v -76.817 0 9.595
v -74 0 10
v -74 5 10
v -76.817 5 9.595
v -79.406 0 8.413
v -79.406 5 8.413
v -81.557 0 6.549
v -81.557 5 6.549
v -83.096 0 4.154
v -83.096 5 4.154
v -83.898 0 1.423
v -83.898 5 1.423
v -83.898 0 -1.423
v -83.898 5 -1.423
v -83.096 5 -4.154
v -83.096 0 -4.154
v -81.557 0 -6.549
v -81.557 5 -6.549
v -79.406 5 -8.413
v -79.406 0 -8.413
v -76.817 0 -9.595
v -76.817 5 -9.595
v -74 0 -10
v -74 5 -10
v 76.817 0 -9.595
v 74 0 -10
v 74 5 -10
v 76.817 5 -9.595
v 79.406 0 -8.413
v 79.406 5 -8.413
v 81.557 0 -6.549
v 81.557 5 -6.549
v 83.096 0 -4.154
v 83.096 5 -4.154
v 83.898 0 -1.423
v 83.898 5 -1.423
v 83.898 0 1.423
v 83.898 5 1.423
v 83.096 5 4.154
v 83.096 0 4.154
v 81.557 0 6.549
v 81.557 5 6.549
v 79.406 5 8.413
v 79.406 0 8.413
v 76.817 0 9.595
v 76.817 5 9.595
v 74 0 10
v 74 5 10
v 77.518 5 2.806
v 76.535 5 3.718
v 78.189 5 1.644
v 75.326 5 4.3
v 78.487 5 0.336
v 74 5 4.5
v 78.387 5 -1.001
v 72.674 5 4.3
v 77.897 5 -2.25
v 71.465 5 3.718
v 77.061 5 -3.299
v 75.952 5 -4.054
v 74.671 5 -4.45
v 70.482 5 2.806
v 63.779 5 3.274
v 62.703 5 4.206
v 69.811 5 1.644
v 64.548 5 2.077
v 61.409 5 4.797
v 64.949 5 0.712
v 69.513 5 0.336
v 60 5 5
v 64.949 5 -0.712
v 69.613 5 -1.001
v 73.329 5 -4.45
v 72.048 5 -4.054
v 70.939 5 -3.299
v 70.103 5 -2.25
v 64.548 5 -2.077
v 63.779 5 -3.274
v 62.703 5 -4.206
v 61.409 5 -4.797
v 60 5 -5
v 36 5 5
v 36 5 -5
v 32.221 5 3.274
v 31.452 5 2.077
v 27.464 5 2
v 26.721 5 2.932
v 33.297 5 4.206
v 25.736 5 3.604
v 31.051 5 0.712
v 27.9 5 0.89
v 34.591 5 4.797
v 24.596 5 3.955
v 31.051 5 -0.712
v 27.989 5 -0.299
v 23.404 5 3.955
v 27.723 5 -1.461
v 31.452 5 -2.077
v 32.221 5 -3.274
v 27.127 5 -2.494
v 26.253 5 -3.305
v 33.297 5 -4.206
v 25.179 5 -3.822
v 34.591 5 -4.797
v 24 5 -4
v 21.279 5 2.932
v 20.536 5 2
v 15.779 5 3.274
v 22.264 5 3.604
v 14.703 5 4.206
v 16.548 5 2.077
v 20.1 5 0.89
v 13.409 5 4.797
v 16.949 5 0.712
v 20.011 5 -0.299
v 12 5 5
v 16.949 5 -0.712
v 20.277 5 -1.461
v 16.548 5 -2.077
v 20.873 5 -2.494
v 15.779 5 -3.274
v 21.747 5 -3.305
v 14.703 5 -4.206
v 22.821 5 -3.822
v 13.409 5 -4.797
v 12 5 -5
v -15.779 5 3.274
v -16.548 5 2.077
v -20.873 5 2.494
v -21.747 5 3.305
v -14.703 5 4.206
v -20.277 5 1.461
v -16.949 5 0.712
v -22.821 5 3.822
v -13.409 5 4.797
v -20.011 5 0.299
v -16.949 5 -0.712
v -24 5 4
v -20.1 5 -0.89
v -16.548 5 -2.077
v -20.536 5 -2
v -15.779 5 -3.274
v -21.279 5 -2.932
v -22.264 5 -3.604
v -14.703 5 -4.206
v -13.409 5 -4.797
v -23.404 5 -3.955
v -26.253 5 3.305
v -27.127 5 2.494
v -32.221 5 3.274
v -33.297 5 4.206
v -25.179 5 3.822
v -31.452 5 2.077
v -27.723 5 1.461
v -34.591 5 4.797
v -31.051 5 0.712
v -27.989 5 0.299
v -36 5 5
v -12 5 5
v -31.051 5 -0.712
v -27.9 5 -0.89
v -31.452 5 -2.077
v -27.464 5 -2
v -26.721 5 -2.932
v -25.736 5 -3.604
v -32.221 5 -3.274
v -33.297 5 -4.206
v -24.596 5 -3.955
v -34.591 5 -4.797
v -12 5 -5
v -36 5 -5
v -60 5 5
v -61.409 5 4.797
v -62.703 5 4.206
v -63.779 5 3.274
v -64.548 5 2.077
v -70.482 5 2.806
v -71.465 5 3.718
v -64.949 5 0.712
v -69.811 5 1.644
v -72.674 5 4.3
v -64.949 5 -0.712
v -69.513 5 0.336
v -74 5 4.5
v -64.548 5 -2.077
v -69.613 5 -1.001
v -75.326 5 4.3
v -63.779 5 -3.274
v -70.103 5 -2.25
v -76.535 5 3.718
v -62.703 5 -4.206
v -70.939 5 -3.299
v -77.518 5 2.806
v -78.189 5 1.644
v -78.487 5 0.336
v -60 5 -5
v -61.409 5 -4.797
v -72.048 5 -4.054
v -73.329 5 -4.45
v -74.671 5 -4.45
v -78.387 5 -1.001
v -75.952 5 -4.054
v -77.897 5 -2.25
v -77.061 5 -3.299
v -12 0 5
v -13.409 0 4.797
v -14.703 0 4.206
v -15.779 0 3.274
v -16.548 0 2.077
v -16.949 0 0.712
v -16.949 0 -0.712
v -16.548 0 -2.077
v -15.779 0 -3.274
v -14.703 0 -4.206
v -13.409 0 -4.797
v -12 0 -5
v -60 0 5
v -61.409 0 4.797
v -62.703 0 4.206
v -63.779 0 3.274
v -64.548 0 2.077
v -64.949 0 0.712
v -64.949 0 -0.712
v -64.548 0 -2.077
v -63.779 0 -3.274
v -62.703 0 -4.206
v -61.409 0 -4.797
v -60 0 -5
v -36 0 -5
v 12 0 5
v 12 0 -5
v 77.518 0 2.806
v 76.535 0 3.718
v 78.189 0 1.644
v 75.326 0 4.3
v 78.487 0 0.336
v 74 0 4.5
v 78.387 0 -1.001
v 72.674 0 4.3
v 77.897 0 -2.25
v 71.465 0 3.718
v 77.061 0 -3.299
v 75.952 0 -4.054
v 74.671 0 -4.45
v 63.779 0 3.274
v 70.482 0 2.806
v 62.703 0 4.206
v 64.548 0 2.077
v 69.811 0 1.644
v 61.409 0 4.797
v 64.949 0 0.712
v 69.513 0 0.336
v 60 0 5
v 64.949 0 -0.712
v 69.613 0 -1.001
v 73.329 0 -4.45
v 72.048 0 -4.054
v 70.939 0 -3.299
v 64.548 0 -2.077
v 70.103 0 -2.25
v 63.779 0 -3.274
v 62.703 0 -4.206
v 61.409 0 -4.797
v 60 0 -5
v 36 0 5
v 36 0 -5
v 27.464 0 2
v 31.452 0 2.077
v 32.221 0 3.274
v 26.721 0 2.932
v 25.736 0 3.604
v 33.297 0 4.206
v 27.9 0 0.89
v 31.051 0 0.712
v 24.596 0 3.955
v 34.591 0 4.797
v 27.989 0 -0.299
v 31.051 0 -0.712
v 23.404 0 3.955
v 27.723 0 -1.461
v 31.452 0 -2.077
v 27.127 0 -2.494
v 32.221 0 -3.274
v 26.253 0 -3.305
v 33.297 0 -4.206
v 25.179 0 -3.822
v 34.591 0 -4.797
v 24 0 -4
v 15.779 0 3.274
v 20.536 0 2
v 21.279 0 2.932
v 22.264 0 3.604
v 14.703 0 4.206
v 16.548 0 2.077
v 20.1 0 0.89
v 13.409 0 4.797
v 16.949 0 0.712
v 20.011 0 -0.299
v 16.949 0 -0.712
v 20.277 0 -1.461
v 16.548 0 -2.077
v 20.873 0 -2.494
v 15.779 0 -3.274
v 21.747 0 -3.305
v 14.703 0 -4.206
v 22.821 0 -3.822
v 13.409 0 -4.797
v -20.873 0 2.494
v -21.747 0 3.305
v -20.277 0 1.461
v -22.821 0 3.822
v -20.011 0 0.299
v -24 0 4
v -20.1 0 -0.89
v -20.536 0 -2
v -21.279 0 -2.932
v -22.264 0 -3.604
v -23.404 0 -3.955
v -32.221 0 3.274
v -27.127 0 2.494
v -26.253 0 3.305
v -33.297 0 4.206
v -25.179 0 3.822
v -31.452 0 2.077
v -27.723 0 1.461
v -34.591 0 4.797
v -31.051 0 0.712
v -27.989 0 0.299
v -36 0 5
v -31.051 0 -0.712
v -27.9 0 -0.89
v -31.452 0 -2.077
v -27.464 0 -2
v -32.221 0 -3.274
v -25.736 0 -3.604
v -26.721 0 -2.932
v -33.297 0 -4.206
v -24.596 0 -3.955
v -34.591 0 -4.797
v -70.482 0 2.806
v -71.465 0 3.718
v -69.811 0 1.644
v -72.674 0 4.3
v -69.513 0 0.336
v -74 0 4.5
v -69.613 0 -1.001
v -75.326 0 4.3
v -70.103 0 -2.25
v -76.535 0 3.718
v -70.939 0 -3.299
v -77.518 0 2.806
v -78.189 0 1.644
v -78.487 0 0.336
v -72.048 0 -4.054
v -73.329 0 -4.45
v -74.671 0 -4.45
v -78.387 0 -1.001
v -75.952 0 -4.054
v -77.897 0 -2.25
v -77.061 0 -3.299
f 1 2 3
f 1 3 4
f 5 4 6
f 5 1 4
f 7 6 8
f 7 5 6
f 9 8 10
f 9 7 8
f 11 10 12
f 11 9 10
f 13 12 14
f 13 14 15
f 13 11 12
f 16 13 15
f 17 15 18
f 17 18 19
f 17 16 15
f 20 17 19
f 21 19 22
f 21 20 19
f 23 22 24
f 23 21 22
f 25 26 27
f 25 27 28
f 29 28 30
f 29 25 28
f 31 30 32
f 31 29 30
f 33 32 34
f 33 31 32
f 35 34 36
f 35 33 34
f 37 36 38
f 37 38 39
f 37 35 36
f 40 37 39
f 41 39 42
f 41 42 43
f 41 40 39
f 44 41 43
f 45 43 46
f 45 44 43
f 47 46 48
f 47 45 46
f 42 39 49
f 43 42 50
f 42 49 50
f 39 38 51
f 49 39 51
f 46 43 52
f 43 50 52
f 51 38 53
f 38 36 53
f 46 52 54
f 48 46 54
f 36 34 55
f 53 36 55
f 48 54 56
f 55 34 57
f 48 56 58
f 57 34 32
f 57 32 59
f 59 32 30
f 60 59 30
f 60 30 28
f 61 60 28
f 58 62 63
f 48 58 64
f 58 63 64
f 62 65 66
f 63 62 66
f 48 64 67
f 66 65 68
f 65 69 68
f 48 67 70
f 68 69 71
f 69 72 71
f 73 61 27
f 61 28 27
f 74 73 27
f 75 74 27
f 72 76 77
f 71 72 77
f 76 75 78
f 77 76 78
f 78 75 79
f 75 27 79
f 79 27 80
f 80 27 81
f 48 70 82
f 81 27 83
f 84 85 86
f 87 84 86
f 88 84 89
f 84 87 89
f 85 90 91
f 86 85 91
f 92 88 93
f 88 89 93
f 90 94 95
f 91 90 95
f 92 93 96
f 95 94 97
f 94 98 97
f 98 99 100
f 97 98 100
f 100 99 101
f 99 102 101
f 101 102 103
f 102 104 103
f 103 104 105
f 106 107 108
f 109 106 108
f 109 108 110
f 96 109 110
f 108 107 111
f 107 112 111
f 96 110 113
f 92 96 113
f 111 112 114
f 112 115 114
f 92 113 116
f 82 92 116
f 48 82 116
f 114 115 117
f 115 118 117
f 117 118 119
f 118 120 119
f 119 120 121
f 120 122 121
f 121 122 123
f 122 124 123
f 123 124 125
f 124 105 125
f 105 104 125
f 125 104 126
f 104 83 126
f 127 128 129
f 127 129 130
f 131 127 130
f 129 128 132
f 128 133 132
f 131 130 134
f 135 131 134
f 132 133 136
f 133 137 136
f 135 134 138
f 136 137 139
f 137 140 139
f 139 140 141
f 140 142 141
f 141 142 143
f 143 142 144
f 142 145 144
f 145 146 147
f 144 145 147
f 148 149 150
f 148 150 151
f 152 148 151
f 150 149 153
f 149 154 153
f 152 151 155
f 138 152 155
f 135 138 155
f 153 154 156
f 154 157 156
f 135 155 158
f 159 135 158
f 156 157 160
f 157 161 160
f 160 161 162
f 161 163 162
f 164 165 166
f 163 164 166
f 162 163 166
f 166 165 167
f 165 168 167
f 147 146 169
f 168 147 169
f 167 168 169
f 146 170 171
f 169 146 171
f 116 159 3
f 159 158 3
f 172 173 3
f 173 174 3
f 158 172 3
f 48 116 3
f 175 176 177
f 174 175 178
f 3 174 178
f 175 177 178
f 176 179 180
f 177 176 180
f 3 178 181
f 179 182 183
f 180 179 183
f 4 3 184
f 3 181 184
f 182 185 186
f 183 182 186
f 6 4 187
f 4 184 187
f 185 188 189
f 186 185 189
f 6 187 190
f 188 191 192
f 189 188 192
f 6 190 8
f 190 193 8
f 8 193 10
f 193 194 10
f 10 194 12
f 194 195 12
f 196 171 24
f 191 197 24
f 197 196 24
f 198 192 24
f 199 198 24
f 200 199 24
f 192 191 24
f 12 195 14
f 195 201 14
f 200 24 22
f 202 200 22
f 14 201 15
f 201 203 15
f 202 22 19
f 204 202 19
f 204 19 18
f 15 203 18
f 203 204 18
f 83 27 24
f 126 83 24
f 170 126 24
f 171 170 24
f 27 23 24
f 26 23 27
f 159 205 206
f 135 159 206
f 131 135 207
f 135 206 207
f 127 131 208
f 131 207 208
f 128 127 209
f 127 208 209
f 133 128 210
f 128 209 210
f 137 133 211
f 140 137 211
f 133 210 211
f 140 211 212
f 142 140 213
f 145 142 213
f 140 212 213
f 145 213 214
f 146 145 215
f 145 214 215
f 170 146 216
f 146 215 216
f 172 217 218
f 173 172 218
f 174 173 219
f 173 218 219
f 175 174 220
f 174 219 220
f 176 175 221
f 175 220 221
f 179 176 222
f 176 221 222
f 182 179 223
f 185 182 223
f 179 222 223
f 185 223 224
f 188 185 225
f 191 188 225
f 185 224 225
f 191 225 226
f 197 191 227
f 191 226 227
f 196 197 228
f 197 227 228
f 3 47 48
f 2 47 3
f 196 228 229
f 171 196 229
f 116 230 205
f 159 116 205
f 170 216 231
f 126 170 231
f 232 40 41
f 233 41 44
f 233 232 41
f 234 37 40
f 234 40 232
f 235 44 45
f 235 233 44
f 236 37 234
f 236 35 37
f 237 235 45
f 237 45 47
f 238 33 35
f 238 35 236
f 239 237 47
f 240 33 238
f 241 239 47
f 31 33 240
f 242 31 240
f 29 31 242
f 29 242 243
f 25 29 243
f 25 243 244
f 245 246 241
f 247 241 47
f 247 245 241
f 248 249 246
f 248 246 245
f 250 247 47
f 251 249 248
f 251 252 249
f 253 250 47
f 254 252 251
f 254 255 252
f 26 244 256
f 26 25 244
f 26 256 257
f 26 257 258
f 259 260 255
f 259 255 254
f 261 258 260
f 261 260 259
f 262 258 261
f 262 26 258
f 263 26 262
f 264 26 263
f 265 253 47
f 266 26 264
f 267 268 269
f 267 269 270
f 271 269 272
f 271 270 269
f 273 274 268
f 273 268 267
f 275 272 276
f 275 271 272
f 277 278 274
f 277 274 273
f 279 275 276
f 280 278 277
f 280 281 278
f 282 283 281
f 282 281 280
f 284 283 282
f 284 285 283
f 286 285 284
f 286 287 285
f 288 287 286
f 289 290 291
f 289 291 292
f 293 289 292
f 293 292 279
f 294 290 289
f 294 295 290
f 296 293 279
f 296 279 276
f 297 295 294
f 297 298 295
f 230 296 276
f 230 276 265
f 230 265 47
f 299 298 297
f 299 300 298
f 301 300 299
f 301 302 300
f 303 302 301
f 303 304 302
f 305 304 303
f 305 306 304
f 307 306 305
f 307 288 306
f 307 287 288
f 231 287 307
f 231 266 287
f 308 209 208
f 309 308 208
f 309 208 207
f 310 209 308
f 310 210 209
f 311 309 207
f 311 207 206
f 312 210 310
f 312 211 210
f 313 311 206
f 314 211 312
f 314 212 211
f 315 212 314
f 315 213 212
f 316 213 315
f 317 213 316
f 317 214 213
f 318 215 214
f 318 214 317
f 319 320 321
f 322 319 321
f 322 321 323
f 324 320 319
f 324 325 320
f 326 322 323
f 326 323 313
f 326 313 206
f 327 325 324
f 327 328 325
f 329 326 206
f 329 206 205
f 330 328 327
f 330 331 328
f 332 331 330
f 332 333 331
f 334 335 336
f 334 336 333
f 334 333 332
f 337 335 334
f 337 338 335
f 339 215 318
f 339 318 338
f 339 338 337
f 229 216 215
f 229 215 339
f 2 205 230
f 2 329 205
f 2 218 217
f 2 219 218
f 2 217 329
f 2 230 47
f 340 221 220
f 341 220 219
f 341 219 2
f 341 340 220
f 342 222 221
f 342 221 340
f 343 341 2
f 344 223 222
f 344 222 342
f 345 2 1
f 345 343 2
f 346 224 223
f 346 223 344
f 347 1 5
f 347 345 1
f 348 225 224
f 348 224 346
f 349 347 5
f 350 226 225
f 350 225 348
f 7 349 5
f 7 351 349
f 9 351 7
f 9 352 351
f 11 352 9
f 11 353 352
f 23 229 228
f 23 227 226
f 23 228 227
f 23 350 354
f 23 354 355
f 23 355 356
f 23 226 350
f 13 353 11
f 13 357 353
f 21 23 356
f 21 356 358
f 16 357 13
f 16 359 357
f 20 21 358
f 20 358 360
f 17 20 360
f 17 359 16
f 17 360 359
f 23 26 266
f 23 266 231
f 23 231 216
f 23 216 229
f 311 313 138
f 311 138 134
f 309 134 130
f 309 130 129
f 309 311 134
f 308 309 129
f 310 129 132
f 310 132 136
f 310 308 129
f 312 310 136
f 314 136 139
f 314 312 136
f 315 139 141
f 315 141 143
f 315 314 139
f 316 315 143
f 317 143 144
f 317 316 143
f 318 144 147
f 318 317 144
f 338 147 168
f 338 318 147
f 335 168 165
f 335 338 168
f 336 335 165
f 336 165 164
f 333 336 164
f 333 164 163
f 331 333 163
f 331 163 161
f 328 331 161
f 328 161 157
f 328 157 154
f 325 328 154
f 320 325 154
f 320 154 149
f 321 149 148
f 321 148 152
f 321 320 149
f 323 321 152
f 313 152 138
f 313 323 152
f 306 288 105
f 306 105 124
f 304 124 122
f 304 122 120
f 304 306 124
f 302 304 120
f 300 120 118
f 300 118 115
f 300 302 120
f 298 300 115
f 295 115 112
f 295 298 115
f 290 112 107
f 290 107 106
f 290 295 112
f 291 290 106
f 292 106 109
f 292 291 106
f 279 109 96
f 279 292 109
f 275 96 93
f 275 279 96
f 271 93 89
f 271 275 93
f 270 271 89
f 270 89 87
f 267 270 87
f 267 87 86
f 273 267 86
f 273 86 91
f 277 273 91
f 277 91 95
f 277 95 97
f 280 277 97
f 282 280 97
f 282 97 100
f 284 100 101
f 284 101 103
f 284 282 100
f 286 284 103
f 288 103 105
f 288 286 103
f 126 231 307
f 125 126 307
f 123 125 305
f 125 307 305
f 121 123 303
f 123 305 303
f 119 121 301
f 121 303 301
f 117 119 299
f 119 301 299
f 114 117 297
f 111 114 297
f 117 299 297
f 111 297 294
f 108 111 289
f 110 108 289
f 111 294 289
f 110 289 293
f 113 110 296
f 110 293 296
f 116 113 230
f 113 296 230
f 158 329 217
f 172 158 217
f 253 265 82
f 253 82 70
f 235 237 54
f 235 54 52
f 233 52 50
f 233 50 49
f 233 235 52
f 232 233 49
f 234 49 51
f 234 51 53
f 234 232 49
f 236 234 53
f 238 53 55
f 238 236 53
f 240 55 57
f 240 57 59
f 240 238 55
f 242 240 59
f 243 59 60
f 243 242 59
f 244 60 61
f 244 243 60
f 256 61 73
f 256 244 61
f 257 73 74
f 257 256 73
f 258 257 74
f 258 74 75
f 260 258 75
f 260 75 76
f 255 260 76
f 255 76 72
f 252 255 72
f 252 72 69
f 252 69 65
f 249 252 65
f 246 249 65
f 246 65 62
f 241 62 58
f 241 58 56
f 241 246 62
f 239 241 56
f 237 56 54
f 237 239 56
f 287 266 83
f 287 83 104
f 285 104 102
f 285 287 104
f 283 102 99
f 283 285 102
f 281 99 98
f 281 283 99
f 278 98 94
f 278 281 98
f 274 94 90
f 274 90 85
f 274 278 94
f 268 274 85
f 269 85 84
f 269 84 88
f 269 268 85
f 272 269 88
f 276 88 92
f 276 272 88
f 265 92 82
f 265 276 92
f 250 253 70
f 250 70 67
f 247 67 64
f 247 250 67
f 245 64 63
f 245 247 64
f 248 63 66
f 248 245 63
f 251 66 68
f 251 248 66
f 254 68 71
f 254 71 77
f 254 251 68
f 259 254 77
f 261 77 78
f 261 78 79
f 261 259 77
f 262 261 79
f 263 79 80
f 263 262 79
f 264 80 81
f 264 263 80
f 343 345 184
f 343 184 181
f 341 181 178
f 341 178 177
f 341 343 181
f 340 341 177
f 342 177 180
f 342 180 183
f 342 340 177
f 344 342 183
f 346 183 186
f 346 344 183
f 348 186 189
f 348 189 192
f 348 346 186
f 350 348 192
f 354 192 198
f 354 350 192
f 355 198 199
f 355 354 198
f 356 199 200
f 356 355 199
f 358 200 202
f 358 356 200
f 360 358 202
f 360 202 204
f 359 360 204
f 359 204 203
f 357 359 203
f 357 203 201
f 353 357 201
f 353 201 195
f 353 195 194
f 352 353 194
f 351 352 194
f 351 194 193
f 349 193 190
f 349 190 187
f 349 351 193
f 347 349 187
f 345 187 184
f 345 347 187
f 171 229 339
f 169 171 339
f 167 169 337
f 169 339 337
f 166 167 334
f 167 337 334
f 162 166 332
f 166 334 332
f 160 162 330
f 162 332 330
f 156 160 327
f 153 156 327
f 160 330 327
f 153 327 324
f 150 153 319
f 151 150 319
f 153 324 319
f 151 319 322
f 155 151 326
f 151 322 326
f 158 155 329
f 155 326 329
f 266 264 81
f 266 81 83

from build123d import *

# Parameters (mm, degrees)
SKETCH_1_R      = 4.5
SKETCH_1_R_2    = 4
EXTRUDE_1_DEPTH = 5


with BuildPart() as part:
    # 草图1 → 凸台-拉伸1 (new body)
    with BuildSketch(Plane(origin=(0, 0, 0), x_dir=(1, 0, 0), z_dir=(0, 1, 0))):
        with BuildLine():
            Line((-74, 10), (74, 10))
            ThreePointArc((74, 10), (84, 0), (74, -10))
            Line((74, -10), (-74, -10))
            ThreePointArc((-74, -10), (-84, 0), (-74, 10))
        make_face()
        with Locations(Location((74, 0, 0), (0, 0, 270))):
            Circle(SKETCH_1_R, mode=Mode.SUBTRACT)
        with Locations(Location((-74, 0, 0), (0, 0, 270))):
            Circle(SKETCH_1_R, mode=Mode.SUBTRACT)
        with Locations(Location((-24, 0, 0), (0, 0, 270))):
            Circle(SKETCH_1_R_2, mode=Mode.SUBTRACT)
        with Locations(Location((24, 0, 0), (0, 0, 90))):
            Circle(SKETCH_1_R_2, mode=Mode.SUBTRACT)
        with BuildLine():
            Line((-60, 5), (-36, 5))
            ThreePointArc((-36, 5), (-31, 0), (-36, -5))
            Line((-36, -5), (-60, -5))
            ThreePointArc((-60, -5), (-65, 0), (-60, 5))
        make_face(mode=Mode.SUBTRACT)
        with BuildLine():
            Line((-12, 5), (12, 5))
            ThreePointArc((12, 5), (17, 0), (12, -5))
            Line((12, -5), (-12, -5))
            ThreePointArc((-12, -5), (-17, 0), (-12, 5))
        make_face(mode=Mode.SUBTRACT)
        with BuildLine():
            Line((60, 5), (36, 5))
            ThreePointArc((36, 5), (31, 0), (36, -5))
            Line((36, -5), (60, -5))
            ThreePointArc((60, -5), (65, 0), (60, 5))
        make_face(mode=Mode.SUBTRACT)
    extrude(amount=EXTRUDE_1_DEPTH)


solid = part.part
